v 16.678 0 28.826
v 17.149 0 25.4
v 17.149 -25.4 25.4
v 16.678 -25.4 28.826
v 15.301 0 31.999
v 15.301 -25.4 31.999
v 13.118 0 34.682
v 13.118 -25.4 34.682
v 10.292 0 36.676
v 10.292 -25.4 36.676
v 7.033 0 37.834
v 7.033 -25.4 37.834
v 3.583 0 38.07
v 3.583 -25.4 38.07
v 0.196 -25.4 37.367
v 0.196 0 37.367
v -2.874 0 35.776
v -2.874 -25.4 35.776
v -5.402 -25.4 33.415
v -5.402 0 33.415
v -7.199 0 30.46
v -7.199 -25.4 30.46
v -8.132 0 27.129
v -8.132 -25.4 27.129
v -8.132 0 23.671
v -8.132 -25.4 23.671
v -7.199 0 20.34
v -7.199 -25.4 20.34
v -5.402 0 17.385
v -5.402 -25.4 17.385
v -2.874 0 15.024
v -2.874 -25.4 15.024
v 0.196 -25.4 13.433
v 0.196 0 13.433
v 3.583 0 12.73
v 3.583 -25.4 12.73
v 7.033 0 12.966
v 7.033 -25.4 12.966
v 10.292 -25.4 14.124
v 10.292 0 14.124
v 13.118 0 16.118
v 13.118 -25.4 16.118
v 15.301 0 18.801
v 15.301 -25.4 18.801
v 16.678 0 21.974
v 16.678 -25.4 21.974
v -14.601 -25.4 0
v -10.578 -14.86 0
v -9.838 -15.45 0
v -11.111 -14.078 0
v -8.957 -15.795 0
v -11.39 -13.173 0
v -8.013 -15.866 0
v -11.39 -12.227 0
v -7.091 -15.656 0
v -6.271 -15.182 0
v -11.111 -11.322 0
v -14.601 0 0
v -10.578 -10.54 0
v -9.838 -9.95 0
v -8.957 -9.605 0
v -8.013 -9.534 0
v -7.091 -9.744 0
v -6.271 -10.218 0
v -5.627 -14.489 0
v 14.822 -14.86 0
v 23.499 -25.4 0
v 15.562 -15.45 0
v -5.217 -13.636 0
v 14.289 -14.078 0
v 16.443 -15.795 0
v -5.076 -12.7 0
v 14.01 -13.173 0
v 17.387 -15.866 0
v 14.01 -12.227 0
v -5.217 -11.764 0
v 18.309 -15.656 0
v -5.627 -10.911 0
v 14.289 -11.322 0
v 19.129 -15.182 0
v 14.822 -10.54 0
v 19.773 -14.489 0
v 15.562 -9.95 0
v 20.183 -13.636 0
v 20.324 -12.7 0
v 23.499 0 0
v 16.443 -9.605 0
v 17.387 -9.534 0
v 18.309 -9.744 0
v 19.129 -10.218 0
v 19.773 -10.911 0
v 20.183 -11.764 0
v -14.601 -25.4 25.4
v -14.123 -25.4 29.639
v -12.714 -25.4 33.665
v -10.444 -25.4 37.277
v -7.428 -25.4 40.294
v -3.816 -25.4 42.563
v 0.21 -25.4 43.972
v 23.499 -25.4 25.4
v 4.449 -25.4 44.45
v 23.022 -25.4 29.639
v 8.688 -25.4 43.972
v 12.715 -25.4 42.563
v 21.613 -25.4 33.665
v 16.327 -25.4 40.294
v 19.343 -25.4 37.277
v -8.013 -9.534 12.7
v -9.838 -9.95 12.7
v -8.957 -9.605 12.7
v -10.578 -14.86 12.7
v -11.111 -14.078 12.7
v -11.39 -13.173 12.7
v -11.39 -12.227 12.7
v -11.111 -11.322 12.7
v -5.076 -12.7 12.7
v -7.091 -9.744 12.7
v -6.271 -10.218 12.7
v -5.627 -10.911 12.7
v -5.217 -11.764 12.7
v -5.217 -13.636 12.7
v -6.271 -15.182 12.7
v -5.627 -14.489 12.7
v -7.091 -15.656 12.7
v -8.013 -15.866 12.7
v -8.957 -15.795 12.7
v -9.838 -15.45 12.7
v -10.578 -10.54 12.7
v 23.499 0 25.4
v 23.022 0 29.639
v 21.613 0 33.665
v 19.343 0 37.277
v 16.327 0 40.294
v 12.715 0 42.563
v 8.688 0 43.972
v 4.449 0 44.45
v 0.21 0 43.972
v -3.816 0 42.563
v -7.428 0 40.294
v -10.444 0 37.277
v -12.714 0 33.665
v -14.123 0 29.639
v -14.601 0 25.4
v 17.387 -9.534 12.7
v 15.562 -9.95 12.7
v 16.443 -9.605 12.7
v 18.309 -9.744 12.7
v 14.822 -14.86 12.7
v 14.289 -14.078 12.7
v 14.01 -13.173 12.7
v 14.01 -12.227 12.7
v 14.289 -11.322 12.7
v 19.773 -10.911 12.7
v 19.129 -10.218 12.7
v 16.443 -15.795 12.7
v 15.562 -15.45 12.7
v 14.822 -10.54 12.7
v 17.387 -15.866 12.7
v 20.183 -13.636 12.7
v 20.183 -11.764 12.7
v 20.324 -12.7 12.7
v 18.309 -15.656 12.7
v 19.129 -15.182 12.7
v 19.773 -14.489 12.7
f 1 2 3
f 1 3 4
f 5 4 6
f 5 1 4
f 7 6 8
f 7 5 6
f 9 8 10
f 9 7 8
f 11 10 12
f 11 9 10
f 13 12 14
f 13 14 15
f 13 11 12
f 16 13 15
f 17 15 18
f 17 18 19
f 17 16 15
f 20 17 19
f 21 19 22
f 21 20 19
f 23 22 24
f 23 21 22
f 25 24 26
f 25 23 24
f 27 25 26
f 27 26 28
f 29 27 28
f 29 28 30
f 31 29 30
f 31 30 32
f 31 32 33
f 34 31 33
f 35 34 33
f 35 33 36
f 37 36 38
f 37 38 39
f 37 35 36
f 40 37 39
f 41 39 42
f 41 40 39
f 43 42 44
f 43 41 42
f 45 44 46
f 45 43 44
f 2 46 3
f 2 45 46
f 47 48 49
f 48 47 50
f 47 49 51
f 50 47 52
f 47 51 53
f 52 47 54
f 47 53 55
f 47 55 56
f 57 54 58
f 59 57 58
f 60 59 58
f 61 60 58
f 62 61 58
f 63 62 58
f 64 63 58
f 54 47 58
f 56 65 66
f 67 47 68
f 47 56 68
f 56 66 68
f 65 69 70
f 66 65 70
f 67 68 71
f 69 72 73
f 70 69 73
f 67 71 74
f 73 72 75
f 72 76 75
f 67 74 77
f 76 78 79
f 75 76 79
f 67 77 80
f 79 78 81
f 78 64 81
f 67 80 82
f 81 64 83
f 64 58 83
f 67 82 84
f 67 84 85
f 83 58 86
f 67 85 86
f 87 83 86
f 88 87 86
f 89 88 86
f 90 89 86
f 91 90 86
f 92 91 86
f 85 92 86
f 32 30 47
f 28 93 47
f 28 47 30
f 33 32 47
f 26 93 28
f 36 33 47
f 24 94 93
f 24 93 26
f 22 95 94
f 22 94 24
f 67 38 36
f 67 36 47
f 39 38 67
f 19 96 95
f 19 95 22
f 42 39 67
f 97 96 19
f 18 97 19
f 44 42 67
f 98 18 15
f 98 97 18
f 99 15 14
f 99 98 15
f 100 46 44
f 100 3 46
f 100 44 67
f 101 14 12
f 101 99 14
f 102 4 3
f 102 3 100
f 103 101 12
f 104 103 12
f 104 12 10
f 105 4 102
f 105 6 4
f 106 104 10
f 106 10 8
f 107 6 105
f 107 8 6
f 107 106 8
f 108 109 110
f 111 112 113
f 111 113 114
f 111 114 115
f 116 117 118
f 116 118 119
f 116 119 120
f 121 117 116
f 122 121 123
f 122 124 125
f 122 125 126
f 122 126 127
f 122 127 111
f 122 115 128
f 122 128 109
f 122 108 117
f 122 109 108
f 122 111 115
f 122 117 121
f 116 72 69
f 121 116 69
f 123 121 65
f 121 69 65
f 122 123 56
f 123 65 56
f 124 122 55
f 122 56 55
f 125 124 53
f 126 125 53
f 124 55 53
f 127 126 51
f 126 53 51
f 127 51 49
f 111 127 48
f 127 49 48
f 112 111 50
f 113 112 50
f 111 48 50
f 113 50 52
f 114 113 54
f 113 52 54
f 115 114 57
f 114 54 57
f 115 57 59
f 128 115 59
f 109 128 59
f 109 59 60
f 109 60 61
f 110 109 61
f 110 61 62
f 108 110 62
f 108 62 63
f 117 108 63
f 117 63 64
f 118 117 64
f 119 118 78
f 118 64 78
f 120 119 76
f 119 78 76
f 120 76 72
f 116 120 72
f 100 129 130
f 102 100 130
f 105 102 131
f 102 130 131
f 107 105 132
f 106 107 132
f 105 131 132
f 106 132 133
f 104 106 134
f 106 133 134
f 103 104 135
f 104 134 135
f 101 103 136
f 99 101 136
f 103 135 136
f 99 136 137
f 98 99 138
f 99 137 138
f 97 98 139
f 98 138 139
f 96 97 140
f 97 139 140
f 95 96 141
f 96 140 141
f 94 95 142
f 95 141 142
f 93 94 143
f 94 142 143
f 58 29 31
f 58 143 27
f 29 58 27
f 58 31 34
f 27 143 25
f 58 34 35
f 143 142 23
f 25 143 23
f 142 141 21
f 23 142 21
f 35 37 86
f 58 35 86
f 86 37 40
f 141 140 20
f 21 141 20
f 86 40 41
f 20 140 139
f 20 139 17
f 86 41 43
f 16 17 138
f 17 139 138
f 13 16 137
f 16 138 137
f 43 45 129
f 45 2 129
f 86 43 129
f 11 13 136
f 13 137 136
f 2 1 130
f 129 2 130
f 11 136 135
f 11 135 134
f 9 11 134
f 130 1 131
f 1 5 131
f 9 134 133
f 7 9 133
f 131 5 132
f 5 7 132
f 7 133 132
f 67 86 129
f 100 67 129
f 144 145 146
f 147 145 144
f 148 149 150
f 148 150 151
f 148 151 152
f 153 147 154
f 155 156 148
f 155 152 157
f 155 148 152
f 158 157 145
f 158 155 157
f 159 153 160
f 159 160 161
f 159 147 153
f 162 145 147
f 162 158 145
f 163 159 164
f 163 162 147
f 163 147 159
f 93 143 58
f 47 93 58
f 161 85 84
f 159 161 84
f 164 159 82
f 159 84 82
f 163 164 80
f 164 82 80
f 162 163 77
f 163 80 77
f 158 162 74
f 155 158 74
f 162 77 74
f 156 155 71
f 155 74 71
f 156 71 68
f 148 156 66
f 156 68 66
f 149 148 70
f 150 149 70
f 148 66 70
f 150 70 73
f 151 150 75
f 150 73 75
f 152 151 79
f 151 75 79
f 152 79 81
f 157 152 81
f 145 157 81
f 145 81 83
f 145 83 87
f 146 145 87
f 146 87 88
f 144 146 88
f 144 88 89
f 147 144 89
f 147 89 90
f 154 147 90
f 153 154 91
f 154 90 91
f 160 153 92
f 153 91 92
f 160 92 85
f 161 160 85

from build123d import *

# Parameters (mm, degrees)
F0_R     = 12.7
F1_DEPTH = 25.4
F2_R     = 3.175
F3_DEPTH = 12.7


with BuildPart() as f1:
    # F0 (on Front) → F1 (new body)
    with BuildSketch(Plane.XZ):
        with BuildLine():
            Line((-14.600585, 25.4), (-14.600585, 0))
            Line((-14.600585, 0), (23.499415, 0))
            Line((23.499415, 0), (23.499415, 25.4))
            ThreePointArc((23.499415, 25.4), (4.449415, 44.45), (-14.600585, 25.4))
        make_face()
        with Locations((4.449415, 25.4)):
            Circle(F0_R, mode=Mode.SUBTRACT)
    extrude(amount=F1_DEPTH)

    # F2 (on face) → F3 (cut)
    with BuildSketch(Plane(origin=(0, 0, 0), x_dir=(1, 0, 0), z_dir=(0, 0, -1))):
        with Locations((-8.250585, 12.7)):
            Circle(F2_R)
        with Locations((17.149415, 12.7)):
            Circle(F2_R)
    extrude(amount=-F3_DEPTH, mode=Mode.SUBTRACT)


solid = f1.part
